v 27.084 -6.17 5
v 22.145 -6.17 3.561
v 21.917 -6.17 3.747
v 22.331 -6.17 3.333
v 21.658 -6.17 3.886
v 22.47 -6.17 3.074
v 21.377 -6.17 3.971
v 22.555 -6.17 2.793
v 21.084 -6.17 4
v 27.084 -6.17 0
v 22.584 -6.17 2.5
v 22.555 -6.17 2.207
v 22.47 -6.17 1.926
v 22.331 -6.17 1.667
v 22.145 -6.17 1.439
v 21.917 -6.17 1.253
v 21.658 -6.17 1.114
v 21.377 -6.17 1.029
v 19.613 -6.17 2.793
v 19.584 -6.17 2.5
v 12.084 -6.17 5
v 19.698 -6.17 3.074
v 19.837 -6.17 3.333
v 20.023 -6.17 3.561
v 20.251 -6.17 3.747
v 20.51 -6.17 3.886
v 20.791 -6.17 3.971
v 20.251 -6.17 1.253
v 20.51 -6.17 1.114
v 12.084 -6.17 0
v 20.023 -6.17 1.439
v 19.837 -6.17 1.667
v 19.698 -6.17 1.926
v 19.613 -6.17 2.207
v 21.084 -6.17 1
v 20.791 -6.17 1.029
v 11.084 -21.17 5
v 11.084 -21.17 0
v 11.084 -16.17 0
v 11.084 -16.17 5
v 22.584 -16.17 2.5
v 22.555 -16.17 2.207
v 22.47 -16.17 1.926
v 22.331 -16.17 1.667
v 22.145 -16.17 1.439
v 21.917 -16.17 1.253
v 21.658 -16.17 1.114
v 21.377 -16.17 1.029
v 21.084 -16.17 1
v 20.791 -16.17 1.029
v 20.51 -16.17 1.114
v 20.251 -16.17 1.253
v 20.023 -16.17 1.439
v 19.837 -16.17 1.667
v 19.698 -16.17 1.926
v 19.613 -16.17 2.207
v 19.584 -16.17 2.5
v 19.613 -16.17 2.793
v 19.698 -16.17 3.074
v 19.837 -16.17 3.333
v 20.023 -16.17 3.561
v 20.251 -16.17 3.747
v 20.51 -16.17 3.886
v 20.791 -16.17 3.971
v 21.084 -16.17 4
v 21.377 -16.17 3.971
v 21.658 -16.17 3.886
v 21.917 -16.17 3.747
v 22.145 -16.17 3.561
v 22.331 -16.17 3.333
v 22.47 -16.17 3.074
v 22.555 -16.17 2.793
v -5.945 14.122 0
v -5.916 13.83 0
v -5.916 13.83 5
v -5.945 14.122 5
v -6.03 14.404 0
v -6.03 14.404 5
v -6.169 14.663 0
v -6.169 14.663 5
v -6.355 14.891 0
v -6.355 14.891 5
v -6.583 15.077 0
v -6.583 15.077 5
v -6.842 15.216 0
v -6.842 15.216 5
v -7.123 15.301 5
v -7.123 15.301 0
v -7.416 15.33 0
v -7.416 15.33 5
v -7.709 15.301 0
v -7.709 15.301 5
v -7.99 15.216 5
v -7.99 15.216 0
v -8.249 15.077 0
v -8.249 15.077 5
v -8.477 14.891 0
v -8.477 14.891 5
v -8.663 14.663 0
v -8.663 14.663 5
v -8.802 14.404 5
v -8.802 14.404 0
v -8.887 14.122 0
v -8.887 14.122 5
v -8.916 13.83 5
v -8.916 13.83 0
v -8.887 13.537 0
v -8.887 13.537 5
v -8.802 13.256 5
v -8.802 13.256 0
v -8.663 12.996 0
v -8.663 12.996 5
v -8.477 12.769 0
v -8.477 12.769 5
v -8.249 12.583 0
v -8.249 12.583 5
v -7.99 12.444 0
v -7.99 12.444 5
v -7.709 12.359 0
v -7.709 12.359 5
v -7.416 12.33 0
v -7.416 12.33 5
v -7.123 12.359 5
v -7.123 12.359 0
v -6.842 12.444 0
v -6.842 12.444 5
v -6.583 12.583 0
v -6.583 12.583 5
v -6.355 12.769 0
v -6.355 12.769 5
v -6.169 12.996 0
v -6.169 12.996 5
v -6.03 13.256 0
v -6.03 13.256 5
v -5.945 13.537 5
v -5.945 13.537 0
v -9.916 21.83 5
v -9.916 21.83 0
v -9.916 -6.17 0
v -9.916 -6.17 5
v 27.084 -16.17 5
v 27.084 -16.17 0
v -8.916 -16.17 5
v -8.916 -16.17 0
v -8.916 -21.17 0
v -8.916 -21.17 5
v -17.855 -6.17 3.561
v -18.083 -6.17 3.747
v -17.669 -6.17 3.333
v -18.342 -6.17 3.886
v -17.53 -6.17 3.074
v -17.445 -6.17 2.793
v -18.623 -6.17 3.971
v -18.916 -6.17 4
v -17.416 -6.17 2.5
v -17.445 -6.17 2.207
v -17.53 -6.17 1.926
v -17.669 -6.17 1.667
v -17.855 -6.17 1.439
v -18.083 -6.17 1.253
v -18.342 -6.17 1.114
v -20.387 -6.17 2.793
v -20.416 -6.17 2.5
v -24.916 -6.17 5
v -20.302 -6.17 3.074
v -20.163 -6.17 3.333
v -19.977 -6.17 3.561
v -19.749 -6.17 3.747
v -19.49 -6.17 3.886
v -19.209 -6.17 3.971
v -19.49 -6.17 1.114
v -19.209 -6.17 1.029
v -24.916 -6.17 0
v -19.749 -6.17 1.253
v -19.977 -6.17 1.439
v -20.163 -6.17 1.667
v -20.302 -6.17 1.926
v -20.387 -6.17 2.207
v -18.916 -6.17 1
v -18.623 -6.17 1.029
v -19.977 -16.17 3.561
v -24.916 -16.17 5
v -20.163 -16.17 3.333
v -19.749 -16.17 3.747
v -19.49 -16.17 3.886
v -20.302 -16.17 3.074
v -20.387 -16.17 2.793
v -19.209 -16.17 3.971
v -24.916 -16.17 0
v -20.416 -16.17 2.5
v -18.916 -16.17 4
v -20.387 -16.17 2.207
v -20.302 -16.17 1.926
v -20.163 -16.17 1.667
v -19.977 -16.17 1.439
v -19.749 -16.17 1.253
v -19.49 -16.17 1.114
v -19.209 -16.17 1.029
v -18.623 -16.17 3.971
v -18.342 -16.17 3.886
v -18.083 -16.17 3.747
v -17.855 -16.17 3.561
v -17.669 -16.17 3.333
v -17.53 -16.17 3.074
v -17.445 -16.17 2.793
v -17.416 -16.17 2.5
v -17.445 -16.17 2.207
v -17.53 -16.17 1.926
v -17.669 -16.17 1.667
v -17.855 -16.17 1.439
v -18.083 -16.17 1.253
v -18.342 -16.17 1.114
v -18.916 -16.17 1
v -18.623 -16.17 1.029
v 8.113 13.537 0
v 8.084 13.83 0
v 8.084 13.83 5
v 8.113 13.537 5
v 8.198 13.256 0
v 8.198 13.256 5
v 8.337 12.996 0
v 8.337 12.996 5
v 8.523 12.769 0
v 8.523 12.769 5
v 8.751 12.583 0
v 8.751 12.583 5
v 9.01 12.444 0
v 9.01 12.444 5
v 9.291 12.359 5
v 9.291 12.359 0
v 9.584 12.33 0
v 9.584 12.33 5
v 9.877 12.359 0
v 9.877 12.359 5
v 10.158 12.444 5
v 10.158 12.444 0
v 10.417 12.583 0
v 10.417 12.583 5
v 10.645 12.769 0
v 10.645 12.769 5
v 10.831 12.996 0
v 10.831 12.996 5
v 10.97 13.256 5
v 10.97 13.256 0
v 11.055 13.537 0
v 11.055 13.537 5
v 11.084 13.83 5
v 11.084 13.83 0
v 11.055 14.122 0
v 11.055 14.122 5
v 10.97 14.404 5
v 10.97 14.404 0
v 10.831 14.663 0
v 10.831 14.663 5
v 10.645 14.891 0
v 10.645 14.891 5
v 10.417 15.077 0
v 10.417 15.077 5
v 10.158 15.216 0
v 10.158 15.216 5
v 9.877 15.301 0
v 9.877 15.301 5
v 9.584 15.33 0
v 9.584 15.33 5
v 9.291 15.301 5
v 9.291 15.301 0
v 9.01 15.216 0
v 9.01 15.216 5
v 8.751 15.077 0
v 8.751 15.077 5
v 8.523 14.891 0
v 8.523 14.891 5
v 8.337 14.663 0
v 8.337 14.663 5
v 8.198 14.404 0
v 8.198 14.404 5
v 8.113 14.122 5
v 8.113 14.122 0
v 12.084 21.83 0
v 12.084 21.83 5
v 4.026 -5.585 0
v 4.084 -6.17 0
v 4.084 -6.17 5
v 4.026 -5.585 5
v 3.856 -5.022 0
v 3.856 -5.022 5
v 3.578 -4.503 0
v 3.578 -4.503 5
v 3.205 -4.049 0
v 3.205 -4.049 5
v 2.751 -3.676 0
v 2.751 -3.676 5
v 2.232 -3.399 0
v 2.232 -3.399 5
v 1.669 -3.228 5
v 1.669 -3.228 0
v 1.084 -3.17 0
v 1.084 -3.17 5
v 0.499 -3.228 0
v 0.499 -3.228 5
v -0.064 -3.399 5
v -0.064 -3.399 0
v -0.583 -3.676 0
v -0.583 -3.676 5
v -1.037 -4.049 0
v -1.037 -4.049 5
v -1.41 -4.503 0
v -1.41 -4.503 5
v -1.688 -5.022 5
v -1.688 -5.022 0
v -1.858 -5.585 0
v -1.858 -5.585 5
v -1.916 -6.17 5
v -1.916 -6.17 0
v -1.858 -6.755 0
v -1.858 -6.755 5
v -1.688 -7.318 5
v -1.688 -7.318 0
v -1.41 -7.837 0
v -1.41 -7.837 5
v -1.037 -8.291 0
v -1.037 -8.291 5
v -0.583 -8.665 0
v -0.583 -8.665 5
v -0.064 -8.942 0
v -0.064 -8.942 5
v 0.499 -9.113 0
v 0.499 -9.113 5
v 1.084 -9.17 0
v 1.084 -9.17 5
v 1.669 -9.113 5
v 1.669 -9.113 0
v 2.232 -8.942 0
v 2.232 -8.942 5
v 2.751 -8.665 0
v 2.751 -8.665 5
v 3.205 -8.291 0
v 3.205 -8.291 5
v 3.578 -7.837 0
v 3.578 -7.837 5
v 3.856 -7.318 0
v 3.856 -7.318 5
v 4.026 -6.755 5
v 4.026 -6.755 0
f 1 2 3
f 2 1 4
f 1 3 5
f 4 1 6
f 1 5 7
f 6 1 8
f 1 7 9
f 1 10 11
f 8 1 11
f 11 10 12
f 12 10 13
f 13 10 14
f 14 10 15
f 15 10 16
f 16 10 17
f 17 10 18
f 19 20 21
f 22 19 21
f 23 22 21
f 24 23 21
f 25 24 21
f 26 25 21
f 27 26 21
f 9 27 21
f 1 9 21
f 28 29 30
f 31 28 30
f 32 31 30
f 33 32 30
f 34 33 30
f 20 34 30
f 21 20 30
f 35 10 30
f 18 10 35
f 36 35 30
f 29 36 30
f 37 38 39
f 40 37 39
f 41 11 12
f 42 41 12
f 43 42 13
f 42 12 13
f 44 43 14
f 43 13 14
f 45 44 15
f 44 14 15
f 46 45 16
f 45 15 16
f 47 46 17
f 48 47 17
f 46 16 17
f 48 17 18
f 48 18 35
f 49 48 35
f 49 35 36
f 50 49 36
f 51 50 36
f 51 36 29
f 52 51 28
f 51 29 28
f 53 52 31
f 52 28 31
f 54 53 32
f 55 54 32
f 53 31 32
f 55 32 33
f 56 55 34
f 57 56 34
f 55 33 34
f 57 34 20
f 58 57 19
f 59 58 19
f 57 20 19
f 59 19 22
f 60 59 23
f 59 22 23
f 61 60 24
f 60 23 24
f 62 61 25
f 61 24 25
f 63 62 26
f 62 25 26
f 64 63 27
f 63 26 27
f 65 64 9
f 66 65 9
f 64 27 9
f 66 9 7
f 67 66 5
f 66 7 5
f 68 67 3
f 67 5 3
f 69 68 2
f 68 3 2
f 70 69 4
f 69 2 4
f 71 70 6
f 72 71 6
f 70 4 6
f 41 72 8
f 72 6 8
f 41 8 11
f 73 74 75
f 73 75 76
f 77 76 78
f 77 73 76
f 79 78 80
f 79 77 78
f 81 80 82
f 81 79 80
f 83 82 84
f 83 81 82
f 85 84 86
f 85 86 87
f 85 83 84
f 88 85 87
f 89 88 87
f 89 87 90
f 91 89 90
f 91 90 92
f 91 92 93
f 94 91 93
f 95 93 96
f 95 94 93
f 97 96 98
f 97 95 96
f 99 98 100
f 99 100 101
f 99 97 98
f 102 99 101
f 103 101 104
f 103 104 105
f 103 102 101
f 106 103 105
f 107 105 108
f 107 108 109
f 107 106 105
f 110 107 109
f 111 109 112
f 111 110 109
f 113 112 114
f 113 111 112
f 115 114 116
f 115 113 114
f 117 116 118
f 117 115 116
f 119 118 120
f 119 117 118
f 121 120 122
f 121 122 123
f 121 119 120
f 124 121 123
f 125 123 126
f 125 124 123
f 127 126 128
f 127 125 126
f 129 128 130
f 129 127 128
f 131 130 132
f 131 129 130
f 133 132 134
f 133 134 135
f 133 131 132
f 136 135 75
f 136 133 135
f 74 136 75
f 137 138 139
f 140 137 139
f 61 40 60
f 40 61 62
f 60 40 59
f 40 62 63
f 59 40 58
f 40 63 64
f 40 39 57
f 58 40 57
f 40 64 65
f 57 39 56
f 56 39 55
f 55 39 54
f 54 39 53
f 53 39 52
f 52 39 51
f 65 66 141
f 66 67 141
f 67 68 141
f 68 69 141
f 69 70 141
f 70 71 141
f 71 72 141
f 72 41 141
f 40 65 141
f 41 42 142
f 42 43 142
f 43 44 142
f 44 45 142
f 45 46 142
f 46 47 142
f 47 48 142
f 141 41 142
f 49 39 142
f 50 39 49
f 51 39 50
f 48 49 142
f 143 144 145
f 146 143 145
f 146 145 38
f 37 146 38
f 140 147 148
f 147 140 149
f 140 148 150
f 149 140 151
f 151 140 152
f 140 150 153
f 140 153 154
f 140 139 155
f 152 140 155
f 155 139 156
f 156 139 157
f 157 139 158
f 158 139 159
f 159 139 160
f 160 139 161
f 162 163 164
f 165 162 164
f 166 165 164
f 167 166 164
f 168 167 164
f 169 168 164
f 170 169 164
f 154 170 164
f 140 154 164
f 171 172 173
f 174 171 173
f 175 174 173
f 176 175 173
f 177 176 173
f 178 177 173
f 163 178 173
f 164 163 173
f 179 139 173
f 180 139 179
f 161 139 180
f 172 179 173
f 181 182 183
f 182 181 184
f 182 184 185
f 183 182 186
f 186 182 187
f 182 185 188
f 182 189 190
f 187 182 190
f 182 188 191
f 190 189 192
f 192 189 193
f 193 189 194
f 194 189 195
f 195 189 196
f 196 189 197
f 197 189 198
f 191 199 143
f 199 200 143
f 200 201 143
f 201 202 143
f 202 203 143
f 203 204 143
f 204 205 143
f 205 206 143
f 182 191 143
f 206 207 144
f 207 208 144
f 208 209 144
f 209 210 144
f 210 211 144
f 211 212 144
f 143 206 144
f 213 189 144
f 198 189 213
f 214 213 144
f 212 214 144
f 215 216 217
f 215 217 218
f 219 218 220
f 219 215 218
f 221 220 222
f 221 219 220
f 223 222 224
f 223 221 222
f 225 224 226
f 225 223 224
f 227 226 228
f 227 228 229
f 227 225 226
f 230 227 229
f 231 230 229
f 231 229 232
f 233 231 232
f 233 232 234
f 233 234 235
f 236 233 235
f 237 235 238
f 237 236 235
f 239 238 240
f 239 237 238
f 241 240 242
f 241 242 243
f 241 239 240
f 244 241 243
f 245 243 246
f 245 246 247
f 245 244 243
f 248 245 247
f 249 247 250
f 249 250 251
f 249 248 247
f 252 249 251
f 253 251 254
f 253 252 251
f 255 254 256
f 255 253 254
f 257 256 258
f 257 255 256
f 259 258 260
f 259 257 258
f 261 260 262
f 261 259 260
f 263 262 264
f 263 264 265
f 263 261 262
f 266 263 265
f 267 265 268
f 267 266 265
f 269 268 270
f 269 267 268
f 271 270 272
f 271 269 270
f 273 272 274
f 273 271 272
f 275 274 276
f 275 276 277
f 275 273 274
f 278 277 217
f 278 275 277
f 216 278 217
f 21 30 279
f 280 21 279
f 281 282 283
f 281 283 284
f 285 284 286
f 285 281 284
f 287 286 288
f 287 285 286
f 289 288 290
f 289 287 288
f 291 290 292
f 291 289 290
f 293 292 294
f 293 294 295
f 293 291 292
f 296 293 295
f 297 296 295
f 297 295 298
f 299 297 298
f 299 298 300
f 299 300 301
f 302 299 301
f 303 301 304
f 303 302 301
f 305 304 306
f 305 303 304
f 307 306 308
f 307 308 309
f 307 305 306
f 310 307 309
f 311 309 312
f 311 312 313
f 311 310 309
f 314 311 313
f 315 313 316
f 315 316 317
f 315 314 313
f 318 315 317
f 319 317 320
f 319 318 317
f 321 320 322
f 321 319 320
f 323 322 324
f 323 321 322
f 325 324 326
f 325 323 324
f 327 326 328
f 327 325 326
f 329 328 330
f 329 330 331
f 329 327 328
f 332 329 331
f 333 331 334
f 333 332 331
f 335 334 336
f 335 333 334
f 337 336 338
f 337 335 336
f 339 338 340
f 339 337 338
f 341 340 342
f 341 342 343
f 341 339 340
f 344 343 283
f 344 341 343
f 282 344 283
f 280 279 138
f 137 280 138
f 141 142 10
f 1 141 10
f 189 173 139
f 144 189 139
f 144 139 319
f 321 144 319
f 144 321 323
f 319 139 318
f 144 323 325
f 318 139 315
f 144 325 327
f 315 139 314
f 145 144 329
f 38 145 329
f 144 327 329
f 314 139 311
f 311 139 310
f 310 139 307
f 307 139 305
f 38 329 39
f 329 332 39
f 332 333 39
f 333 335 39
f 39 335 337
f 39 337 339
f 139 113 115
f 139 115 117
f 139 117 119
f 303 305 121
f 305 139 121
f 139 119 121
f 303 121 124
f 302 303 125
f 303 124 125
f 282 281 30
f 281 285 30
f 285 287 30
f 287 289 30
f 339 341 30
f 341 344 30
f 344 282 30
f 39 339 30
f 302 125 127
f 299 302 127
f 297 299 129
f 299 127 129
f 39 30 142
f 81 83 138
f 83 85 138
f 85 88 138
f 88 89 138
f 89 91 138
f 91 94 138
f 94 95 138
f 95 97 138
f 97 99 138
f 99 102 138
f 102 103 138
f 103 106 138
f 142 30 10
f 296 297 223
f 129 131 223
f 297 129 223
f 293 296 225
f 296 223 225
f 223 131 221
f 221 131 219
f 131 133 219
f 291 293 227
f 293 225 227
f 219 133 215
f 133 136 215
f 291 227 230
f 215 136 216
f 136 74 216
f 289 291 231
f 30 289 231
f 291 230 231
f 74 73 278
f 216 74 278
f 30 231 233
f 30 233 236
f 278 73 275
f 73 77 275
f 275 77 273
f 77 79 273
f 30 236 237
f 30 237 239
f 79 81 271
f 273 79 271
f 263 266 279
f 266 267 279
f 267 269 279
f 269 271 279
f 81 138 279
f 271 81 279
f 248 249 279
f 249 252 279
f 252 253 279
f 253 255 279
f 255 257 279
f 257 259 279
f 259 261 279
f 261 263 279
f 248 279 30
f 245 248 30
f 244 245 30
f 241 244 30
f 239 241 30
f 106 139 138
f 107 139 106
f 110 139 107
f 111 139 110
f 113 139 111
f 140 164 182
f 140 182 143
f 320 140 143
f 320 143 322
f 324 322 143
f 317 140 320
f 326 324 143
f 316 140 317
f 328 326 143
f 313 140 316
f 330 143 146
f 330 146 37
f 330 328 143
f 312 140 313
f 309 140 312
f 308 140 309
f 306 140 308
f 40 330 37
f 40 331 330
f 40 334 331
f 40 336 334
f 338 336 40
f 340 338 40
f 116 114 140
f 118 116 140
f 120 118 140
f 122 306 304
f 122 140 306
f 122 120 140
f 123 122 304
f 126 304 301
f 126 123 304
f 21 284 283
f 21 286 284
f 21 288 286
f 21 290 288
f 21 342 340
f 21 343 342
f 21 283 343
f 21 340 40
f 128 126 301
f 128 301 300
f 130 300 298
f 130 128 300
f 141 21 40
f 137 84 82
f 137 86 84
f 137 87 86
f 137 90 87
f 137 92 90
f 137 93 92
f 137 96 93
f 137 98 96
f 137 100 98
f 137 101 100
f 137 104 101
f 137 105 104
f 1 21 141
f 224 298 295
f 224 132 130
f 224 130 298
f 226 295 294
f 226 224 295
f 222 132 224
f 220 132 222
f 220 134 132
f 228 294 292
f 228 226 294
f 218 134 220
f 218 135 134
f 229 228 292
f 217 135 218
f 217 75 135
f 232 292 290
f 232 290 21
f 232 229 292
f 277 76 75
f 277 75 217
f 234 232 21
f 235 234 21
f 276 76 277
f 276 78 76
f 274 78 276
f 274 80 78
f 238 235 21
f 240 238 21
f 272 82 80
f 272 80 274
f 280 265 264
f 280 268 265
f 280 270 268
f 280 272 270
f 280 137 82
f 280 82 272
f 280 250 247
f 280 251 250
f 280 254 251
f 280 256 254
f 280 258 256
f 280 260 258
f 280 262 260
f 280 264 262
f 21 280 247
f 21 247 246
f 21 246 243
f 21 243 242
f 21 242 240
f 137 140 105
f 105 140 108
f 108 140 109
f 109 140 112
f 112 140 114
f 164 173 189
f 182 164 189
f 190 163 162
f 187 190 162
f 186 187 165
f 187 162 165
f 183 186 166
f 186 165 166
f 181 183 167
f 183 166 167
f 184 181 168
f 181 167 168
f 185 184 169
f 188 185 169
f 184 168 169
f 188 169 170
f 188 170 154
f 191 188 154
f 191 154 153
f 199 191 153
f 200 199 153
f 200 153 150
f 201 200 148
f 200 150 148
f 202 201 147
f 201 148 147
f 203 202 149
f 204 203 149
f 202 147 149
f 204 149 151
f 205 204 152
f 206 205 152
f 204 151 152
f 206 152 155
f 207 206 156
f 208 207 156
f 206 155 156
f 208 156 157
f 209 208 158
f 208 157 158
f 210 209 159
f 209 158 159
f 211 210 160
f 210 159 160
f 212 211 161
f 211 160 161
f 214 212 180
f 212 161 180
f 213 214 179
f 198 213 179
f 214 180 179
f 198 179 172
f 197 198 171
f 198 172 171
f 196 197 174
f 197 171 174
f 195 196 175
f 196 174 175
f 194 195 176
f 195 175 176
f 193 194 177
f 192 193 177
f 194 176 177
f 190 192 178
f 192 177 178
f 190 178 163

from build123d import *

# Parameters (mm, degrees)
SKETCH1_R           = 3
SKETCH1_R_2         = 1.5
BOSS_EXTRUDE1_DEPTH = 5
SKETCH2_R           = 1.5
CUT_EXTRUDE1_DEPTH  = 10
SKETCH2_3_R         = 1.5
CUT_EXTRUDE2_DEPTH  = 10


with BuildPart() as part:
    # Sketch1 → Boss-Extrude1 (new body)
    with BuildSketch(Plane.XY):
        Polygon((12.083913986, -6.170151075), (12.083913986, 21.829848925), (-9.916086014, 21.829848925), (-9.916086014, -6.170151075), (-24.916086014, -6.170151075), (-24.916086014, -16.170151075), (-8.916086014, -16.170151075), (-8.916086014, -21.170151075), (11.083913986, -21.170151075), (11.083913986, -16.170151075), (27.083913986, -16.170151075), (27.083913986, -6.170151075), align=None)
        with Locations((1.083913986, -6.170151075)):
            Circle(SKETCH1_R, mode=Mode.SUBTRACT)
        with Locations((-7.416086014, 13.829848925)):
            Circle(SKETCH1_R_2, mode=Mode.SUBTRACT)
        with Locations((9.583913986, 13.829848925)):
            Circle(SKETCH1_R_2, mode=Mode.SUBTRACT)
    extrude(amount=BOSS_EXTRUDE1_DEPTH)

    # Sketch2 → Cut-Extrude1 (cut)
    with BuildSketch(Plane(origin=(0, -6.170151075, 0), x_dir=(1, 0, 0), z_dir=(0, 1, 0))):
        with Locations((-18.916086014, -2.5)):
            Circle(SKETCH2_R)
    extrude(amount=-CUT_EXTRUDE1_DEPTH, mode=Mode.SUBTRACT)

    # Sketch2<3> → Cut-Extrude2 (cut)
    with BuildSketch(Plane(origin=(0, -6.170151075, 0), x_dir=(1, 0, 0), z_dir=(0, 1, 0))):
        with Locations((-18.916086014, -2.5)):
            Circle(SKETCH2_3_R)
        with Locations((21.083913986, -2.5)):
            Circle(SKETCH2_3_R)
    extrude(amount=-CUT_EXTRUDE2_DEPTH, mode=Mode.SUBTRACT)


solid = part.part
